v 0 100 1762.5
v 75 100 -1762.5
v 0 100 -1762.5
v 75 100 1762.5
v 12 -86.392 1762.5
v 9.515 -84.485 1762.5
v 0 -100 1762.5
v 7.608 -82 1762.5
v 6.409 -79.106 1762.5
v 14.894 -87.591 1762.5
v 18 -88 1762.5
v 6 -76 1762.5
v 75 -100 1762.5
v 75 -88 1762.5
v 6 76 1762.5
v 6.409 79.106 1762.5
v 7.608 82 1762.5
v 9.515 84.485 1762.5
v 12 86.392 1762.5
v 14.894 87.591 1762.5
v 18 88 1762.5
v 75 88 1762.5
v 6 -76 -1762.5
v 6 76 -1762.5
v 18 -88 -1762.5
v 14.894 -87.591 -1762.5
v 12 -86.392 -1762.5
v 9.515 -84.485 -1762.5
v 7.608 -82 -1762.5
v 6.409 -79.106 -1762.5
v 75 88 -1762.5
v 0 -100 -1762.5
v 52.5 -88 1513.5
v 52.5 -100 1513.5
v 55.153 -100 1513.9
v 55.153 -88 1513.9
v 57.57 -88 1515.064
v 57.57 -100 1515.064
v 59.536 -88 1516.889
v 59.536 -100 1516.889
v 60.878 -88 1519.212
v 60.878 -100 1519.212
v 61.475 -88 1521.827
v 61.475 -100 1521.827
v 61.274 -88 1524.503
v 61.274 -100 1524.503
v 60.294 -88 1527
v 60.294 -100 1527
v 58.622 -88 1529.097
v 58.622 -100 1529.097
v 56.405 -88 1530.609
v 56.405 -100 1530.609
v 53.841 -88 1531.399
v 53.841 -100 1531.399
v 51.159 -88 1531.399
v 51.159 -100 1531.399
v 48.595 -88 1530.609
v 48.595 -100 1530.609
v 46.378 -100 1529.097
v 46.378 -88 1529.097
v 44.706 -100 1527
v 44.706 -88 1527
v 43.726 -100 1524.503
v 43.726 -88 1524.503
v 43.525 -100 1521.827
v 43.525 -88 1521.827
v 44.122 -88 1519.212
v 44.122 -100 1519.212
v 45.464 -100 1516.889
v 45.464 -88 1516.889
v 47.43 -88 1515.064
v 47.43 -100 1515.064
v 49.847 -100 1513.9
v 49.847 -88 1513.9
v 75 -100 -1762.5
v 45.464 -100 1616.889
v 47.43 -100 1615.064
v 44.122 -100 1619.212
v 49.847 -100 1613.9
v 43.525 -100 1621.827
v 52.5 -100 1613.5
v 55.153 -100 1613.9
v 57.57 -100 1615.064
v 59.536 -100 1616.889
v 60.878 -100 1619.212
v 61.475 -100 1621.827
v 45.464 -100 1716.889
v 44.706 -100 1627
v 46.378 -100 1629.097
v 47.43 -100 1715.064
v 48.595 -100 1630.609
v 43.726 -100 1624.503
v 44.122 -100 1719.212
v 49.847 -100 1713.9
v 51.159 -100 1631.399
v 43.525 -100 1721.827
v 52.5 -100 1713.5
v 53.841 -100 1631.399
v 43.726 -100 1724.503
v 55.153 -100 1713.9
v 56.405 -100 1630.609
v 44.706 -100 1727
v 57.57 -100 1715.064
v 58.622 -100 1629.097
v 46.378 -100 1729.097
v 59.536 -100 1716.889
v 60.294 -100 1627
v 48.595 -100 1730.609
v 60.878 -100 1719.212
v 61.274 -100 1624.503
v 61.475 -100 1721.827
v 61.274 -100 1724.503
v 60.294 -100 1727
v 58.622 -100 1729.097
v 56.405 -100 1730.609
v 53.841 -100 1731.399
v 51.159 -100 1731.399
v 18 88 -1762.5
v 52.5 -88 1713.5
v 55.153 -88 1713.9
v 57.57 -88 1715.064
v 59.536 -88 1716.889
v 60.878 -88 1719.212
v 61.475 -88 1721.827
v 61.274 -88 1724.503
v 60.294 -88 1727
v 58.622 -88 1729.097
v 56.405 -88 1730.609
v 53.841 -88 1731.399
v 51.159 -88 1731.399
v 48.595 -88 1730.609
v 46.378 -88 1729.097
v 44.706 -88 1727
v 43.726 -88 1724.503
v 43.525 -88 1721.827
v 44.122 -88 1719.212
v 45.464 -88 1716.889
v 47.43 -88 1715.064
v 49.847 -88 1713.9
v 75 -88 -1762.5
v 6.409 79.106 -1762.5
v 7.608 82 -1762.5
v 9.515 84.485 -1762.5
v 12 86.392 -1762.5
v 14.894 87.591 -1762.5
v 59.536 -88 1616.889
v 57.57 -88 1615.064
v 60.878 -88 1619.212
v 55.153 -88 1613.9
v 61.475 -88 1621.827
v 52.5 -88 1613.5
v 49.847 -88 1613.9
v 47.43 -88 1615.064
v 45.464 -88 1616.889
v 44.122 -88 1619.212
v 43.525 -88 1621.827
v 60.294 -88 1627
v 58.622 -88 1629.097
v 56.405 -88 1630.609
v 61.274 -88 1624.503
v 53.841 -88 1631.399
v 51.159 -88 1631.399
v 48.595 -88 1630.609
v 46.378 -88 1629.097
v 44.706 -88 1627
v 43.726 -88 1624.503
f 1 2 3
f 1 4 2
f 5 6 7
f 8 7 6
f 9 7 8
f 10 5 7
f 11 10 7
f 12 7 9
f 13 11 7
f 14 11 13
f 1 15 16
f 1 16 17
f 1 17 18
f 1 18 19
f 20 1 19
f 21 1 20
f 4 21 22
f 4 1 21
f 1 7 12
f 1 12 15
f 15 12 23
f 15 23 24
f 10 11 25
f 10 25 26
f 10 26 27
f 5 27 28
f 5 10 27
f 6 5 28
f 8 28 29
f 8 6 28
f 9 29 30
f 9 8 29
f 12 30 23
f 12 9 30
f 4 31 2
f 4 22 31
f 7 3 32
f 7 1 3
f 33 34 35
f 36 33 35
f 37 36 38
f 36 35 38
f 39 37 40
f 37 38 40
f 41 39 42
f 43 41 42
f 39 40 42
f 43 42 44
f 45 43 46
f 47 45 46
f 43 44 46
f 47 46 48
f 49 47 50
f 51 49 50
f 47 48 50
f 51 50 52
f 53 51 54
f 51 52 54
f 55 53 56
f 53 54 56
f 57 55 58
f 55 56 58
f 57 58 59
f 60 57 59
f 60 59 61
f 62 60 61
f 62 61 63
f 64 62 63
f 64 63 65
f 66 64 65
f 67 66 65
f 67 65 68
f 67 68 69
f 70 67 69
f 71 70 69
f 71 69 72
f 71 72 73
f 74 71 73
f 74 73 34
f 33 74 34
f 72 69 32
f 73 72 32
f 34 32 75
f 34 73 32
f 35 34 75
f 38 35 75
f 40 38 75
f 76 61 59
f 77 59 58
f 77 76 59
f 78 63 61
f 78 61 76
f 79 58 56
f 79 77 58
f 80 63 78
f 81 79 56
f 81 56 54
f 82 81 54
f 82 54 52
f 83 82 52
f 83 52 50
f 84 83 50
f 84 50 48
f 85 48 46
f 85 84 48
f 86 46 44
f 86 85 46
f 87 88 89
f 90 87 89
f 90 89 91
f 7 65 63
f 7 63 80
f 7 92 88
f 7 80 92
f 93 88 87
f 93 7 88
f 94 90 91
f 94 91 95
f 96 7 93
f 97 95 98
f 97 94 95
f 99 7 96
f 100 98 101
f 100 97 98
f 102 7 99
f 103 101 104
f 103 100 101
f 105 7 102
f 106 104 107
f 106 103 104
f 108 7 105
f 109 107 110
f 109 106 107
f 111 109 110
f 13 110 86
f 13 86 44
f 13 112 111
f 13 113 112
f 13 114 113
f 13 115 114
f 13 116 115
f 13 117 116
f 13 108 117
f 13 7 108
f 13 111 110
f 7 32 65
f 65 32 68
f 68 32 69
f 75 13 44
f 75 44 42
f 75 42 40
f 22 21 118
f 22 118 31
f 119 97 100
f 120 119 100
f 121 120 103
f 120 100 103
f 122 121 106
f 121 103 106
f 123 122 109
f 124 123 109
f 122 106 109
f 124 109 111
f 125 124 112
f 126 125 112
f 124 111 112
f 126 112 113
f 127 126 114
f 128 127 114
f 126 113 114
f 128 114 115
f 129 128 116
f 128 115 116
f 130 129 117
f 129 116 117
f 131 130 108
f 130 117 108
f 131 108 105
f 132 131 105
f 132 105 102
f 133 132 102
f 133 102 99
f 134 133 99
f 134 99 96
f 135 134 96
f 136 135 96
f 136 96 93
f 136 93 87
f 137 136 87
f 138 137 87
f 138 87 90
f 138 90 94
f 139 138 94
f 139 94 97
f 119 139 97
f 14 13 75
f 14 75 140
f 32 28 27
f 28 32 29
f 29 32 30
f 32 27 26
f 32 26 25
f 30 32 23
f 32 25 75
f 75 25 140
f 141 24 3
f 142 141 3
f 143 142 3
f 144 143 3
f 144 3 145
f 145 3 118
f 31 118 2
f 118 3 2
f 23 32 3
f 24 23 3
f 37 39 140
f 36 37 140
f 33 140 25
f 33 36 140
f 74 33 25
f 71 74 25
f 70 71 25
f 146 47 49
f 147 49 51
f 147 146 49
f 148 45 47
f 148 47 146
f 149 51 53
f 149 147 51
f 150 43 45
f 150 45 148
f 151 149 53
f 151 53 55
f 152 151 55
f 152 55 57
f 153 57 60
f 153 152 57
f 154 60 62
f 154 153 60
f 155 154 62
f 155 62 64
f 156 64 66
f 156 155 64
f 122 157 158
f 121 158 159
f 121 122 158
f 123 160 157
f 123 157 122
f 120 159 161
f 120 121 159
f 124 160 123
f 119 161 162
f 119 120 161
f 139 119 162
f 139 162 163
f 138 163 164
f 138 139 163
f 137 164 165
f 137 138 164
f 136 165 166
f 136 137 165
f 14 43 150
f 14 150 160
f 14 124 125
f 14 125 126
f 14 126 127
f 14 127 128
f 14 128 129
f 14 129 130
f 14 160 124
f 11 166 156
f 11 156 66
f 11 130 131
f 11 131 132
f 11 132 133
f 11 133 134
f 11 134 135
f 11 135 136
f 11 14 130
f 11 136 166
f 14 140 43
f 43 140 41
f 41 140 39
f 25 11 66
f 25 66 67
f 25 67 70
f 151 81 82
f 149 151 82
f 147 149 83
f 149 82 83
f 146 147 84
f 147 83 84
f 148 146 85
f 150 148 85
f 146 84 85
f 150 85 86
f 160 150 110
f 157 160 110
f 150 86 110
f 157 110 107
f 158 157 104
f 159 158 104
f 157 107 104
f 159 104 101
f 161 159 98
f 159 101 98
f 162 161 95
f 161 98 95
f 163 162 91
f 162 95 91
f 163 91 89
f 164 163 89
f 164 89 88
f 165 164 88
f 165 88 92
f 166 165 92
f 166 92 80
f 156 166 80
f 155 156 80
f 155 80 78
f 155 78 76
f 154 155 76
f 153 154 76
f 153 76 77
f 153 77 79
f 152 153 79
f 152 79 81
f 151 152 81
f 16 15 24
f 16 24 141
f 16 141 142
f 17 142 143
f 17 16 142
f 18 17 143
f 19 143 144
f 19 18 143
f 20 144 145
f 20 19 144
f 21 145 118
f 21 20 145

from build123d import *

# Parameters (mm, degrees)
BOSS_EXTRUDE1_DEPTH = 1762.5
CUT_EXTRUDE1_REACH  = 1777.396
SKETCH2_R           = 9


with BuildPart() as part:
    # Sketch1 → Boss-Extrude1 (new, symmetric)
    with BuildSketch(Plane.XY):
        with BuildLine():
            Line((0, 100), (0, -100))
            Line((0, -100), (75, -100))
            Line((75, -100), (75, -88))
            Line((75, -88), (18, -88))
            ThreePointArc((18, -88), (9.514718626, -84.485281374), (6, -76))
            Line((6, -76), (6, 76))
            ThreePointArc((6, 76), (9.514718626, 84.485281374), (18, 88))
            Line((18, 88), (75, 88))
            Line((75, 88), (75, 100))
            Line((75, 100), (0, 100))
        make_face()
    extrude(amount=BOSS_EXTRUDE1_DEPTH, both=True)

    # Sketch2 → Cut-Extrude1 (cut, up to next)
    with BuildSketch(Plane.XZ.offset(100), mode=Mode.PRIVATE) as cut_extrude1_sk1:
        with Locations(Location((52.5, 1722.5, 0), (0, 0, 270))):
            Circle(SKETCH2_R)
    cut_extrude1_tool1 = extrude(cut_extrude1_sk1.sketch, amount=-CUT_EXTRUDE1_REACH, mode=Mode.PRIVATE) & part.part
    # Sketch2 → Cut-Extrude1 (cut, up to next)
    with BuildSketch(Plane.XZ.offset(100), mode=Mode.PRIVATE) as cut_extrude1_sk2:
        with Locations(Location((52.5, 1622.5, 0), (0, 0, 270))):
            Circle(SKETCH2_R)
    cut_extrude1_tool2 = extrude(cut_extrude1_sk2.sketch, amount=-CUT_EXTRUDE1_REACH, mode=Mode.PRIVATE) & part.part
    # Sketch2 → Cut-Extrude1 (cut, up to next)
    with BuildSketch(Plane.XZ.offset(100), mode=Mode.PRIVATE) as cut_extrude1_sk3:
        with Locations(Location((52.5, 1522.5, 0), (0, 0, 270))):
            Circle(SKETCH2_R)
    cut_extrude1_tool3 = extrude(cut_extrude1_sk3.sketch, amount=-CUT_EXTRUDE1_REACH, mode=Mode.PRIVATE) & part.part
    add(cut_extrude1_tool1.solids().sort_by_distance((52.5, -100, 1722.5))[0], mode=Mode.SUBTRACT)
    add(cut_extrude1_tool2.solids().sort_by_distance((52.5, -100, 1622.5))[0], mode=Mode.SUBTRACT)
    add(cut_extrude1_tool3.solids().sort_by_distance((52.5, -100, 1522.5))[0], mode=Mode.SUBTRACT)


solid = part.part
